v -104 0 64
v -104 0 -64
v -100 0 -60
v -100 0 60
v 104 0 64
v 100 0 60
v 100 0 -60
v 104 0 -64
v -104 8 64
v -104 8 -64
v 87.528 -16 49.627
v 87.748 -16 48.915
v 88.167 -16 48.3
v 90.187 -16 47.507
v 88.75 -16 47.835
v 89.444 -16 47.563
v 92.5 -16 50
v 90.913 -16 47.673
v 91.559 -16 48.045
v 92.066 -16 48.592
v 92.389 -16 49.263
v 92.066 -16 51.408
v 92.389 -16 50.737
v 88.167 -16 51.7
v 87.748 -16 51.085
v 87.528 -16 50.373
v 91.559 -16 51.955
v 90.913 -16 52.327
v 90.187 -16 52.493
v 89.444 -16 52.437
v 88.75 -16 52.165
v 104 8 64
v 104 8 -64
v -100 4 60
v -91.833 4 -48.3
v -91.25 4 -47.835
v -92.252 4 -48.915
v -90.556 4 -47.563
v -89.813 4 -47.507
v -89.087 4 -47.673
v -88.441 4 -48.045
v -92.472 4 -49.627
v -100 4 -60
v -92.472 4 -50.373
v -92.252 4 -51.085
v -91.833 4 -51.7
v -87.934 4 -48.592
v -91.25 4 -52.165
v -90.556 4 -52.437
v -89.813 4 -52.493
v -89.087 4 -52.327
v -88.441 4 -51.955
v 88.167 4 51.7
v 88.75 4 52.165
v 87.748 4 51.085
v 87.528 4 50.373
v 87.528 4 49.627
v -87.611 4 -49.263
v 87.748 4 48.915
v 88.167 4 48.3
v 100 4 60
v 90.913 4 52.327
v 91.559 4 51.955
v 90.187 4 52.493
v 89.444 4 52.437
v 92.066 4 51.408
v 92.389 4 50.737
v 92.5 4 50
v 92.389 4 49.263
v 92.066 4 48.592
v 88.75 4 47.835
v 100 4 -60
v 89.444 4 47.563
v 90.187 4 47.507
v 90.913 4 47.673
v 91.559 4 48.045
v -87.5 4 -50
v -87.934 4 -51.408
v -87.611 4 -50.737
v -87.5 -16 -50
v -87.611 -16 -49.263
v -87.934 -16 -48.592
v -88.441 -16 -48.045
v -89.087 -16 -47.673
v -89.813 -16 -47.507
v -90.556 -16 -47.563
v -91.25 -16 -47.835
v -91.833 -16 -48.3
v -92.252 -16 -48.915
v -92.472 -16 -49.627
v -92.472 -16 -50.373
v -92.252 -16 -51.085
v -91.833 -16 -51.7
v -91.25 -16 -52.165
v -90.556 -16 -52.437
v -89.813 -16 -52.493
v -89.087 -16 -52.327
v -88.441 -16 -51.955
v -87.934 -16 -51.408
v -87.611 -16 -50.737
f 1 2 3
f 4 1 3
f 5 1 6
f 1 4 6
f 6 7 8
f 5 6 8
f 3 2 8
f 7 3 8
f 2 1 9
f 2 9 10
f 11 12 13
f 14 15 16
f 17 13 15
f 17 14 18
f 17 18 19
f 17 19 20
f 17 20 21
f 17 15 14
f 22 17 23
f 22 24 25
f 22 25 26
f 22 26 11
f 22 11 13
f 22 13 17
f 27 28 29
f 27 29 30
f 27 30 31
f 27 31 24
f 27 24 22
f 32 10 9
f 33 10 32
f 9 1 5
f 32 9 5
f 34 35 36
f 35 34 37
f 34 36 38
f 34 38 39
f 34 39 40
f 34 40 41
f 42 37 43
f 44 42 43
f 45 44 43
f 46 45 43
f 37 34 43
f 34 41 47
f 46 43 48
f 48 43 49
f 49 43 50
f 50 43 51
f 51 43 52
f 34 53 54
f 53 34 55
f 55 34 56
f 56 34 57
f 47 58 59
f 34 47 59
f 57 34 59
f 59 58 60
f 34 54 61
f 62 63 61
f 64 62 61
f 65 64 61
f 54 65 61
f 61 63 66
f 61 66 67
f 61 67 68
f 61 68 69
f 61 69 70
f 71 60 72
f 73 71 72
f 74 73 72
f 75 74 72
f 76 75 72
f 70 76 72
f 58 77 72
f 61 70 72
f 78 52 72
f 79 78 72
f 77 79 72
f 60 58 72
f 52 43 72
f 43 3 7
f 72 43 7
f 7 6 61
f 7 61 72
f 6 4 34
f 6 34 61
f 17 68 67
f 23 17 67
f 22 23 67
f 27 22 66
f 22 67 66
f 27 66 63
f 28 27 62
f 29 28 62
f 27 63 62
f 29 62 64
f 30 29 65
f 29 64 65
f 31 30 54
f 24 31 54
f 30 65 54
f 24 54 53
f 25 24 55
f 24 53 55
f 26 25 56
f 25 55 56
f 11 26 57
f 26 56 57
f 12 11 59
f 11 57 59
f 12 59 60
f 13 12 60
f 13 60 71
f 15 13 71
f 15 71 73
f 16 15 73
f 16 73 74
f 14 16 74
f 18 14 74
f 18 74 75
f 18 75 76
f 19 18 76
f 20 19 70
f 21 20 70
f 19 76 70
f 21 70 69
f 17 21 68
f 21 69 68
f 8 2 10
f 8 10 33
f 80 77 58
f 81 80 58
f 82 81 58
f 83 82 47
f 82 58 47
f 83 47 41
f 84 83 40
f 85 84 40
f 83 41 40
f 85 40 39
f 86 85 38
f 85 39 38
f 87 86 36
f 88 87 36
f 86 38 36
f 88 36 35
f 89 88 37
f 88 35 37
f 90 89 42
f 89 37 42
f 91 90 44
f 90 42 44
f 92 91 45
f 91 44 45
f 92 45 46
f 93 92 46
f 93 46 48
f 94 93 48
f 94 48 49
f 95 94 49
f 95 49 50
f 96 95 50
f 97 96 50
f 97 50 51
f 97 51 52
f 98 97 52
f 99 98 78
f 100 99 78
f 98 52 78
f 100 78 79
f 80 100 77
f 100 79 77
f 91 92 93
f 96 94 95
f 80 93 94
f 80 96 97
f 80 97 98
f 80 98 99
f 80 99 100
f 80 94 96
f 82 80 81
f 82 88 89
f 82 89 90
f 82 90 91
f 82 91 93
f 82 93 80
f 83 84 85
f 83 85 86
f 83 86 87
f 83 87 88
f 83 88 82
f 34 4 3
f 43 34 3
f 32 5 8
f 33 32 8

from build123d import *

# Parameters (mm, degrees)
CROQUIS1_W              = 208
CROQUIS1_H              = 128
SALIENTE_EXTRUIR1_DEPTH = 8
CROQUIS1_4_W            = 200
CROQUIS1_4_H            = 120
CORTAR_EXTRUIR1_DEPTH   = 4
CROQUIS2_R              = 2.5
SALIENTE_EXTRUIR2_DEPTH = 20


with BuildPart() as part:
    # Croquis1 → Saliente-Extruir1 (new body)
    with BuildSketch(Plane(origin=(0, 0, 0), x_dir=(1, 0, 0), z_dir=(0, 1, 0))):
        Rectangle(CROQUIS1_W, CROQUIS1_H)
    extrude(amount=SALIENTE_EXTRUIR1_DEPTH)

    # Croquis1<4> → Cortar-Extruir1 (cut)
    with BuildSketch(Plane(origin=(0, 0, 0), x_dir=(1, 0, 0), z_dir=(0, 1, 0))):
        Rectangle(CROQUIS1_4_W, CROQUIS1_4_H)
    extrude(amount=CORTAR_EXTRUIR1_DEPTH, mode=Mode.SUBTRACT)

    # Croquis2 → Saliente-Extruir2 (add)
    with BuildSketch(Plane.XZ.offset(-4)):
        with Locations((-90, -50)):
            Circle(CROQUIS2_R)
        with Locations((90, 50)):
            Circle(CROQUIS2_R)
    extrude(amount=SALIENTE_EXTRUIR2_DEPTH)


solid = part.part
